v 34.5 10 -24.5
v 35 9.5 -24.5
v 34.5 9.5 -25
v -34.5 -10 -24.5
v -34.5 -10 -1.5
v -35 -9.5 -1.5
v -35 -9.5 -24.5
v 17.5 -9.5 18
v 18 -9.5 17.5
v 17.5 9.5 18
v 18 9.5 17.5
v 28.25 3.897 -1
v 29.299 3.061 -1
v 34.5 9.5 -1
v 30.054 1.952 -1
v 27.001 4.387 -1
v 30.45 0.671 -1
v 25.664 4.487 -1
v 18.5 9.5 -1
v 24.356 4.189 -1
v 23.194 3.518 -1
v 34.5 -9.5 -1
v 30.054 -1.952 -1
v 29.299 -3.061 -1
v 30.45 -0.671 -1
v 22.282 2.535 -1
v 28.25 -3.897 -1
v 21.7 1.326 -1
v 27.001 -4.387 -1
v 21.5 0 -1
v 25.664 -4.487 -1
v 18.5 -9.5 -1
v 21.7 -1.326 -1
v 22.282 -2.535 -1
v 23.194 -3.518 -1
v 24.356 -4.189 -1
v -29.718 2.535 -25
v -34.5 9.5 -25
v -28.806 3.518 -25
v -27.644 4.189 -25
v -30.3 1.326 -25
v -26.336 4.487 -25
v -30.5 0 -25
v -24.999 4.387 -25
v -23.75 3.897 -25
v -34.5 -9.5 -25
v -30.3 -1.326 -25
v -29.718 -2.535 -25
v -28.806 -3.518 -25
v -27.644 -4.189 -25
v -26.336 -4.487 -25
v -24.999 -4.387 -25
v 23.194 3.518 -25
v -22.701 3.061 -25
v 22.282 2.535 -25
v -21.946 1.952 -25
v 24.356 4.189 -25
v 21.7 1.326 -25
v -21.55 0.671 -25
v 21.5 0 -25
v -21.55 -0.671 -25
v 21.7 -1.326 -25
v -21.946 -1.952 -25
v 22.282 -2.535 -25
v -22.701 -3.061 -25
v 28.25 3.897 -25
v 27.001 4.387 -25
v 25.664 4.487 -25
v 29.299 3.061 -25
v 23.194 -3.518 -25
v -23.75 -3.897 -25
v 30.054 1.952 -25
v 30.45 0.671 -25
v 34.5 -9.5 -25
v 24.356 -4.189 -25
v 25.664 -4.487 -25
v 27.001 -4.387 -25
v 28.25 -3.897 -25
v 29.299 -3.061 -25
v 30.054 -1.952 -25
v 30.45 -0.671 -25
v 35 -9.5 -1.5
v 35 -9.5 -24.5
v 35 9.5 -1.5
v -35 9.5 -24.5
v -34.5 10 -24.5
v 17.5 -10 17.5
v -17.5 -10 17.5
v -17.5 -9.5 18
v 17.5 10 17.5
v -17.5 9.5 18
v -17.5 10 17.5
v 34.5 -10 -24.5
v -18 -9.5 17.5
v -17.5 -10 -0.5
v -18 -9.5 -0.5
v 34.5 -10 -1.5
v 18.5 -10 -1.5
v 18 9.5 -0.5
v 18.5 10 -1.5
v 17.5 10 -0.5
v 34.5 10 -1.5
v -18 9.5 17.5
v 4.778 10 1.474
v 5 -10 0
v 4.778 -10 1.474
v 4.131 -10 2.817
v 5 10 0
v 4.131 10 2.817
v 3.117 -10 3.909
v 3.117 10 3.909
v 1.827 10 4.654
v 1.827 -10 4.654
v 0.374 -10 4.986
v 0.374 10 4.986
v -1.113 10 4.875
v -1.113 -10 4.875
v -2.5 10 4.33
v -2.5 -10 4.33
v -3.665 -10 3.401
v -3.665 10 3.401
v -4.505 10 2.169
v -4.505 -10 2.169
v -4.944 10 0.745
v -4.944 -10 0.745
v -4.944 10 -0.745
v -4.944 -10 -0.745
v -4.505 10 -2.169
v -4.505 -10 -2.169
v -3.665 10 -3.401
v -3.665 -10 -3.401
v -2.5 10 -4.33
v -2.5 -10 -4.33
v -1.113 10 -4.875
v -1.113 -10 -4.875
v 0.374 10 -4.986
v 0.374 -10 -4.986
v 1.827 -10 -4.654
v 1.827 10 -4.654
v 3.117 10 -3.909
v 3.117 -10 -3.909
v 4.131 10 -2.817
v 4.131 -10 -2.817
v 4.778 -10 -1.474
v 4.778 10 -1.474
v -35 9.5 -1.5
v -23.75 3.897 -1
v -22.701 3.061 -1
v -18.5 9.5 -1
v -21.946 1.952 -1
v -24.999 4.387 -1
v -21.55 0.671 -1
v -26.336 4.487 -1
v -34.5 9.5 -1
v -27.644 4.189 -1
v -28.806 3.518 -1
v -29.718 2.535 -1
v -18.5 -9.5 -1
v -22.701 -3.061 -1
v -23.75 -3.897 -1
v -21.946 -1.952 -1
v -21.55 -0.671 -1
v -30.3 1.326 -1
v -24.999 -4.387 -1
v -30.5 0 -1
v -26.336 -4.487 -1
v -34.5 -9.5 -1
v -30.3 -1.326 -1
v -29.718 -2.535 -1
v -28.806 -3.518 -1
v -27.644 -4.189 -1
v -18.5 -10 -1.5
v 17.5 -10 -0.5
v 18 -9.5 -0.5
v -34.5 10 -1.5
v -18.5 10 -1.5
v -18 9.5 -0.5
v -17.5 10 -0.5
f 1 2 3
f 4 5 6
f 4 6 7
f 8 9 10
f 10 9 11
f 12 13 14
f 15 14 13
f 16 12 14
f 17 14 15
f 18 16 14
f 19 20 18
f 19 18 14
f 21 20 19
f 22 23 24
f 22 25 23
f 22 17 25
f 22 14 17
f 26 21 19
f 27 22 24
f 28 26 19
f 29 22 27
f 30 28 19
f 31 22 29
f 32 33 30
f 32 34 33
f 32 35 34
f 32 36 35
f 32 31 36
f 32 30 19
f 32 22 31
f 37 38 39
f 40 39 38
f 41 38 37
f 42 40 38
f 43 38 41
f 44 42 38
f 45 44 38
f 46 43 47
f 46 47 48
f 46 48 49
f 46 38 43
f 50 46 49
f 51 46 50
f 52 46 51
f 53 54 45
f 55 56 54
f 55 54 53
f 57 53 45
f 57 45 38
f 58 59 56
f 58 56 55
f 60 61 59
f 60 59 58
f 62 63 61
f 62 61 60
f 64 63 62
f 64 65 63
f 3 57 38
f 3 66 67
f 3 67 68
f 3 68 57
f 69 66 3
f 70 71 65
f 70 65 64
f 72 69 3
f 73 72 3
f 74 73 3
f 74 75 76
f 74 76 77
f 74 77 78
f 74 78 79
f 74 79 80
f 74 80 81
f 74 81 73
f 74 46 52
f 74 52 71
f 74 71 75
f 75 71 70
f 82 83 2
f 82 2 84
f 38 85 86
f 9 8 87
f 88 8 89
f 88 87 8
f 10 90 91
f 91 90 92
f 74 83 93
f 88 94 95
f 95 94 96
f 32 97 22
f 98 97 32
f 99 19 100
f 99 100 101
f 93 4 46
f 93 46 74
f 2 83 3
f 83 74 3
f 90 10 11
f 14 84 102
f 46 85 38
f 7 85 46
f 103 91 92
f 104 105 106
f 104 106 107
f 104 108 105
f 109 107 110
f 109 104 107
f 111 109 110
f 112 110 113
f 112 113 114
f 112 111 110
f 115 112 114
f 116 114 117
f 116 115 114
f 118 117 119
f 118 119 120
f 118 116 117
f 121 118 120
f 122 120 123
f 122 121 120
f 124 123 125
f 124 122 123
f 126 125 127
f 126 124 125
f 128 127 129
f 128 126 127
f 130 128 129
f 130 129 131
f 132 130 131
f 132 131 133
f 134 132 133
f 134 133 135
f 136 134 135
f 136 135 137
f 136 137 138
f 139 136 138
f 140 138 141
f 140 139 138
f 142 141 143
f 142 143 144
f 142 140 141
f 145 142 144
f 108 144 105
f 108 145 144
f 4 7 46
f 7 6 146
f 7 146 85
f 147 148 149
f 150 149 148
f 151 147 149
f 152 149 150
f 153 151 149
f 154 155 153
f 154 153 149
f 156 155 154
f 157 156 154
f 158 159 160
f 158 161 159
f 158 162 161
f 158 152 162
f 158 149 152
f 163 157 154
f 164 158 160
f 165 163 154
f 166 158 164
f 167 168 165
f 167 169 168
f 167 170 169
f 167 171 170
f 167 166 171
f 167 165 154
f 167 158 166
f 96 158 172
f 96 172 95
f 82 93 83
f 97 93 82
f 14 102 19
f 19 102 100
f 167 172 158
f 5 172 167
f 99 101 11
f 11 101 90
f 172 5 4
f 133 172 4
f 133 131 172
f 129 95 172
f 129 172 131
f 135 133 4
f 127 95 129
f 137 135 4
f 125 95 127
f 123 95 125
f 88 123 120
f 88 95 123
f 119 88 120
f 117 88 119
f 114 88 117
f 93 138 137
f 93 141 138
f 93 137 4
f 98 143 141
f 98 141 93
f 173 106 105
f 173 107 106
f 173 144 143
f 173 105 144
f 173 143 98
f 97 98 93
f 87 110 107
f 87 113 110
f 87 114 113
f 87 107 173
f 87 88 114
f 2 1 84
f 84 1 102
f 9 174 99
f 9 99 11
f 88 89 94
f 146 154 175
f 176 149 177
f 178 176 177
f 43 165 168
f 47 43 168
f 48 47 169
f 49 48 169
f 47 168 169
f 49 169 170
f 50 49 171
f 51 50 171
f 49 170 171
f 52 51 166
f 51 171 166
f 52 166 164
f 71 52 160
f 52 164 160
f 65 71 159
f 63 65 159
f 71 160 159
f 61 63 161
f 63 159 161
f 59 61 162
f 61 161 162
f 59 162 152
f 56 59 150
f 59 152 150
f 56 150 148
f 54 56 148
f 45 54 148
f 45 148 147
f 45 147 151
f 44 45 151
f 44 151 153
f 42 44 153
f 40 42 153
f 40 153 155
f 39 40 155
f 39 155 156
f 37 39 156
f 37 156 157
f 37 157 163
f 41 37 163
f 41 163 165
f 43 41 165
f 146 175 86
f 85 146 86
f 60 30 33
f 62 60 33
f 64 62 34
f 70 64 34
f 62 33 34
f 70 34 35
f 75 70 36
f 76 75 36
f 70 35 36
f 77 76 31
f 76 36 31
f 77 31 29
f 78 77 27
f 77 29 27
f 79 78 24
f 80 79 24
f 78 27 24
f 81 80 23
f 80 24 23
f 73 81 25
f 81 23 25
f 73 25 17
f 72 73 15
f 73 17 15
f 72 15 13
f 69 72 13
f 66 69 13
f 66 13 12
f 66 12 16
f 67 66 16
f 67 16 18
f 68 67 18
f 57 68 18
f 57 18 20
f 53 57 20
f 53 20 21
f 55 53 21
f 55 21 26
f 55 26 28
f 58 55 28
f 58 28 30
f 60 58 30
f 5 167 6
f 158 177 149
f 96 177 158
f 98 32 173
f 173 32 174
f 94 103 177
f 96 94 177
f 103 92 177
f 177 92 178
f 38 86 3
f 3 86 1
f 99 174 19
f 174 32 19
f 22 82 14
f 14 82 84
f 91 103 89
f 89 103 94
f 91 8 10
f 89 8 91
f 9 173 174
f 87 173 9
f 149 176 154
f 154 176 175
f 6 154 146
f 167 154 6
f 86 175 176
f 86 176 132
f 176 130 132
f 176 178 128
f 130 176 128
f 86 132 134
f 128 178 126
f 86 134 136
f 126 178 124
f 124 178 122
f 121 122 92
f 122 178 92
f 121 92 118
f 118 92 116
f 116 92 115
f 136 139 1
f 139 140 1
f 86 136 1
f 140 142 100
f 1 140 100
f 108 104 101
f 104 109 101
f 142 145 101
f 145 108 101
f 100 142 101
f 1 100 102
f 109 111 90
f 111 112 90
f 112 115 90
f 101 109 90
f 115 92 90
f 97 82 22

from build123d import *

# Parameters (mm, degrees)
F0_R     = 5
F1_DEPTH = 10
F2_SIZE  = 0.5
F4_D     = 9


with BuildPart() as f1:
    # F0 (on Front) → F1 (new body, symmetric)
    with BuildSketch(Plane.XZ):
        Polygon((18, 18), (0, 18), (-18, 18), (-18, -1), (-35, -1), (-35, -25), (0, -25), (35, -25), (35, -1), (18, -1), align=None)
        Circle(F0_R, mode=Mode.SUBTRACT)
    extrude(amount=F1_DEPTH, both=True)

    # F2
    f2_edges = [f1.edges().sort_by_distance(p)[0] for p in [
        (0, 10, 18),
        (-18, 0, 18),
        (0, -10, 18),
        (18, 0, 18),
        (-18, 0, -1),
        (-26.5, 10, -1),
        (-35, 0, -1),
        (-26.5, -10, -1),
        (-18, 10, 8.5),
        (-18, -10, 8.5),
        (-35, 10, -13),
        (-35, 0, -25),
        (-35, -10, -13),
        (35, 0, -25),
        (35, 10, -13),
        (35, 0, -1),
        (35, -10, -13),
        (18, 10, 8.5),
        (18, -10, 8.5),
        (18, 0, -1),
        (26.5, 10, -1),
        (26.5, -10, -1),
        (0, 10, -25),
        (0, -10, -25),
    ]]
    chamfer(f2_edges, length=F2_SIZE)

    # F4 (through all)
    with Locations(Plane(origin=(0, 0, -25), x_dir=(1, 0, 0), z_dir=(0, 0, -1))):
        with Locations((-26, 0), (26, 0)):
            Hole(F4_D / 2)


solid = f1.part
